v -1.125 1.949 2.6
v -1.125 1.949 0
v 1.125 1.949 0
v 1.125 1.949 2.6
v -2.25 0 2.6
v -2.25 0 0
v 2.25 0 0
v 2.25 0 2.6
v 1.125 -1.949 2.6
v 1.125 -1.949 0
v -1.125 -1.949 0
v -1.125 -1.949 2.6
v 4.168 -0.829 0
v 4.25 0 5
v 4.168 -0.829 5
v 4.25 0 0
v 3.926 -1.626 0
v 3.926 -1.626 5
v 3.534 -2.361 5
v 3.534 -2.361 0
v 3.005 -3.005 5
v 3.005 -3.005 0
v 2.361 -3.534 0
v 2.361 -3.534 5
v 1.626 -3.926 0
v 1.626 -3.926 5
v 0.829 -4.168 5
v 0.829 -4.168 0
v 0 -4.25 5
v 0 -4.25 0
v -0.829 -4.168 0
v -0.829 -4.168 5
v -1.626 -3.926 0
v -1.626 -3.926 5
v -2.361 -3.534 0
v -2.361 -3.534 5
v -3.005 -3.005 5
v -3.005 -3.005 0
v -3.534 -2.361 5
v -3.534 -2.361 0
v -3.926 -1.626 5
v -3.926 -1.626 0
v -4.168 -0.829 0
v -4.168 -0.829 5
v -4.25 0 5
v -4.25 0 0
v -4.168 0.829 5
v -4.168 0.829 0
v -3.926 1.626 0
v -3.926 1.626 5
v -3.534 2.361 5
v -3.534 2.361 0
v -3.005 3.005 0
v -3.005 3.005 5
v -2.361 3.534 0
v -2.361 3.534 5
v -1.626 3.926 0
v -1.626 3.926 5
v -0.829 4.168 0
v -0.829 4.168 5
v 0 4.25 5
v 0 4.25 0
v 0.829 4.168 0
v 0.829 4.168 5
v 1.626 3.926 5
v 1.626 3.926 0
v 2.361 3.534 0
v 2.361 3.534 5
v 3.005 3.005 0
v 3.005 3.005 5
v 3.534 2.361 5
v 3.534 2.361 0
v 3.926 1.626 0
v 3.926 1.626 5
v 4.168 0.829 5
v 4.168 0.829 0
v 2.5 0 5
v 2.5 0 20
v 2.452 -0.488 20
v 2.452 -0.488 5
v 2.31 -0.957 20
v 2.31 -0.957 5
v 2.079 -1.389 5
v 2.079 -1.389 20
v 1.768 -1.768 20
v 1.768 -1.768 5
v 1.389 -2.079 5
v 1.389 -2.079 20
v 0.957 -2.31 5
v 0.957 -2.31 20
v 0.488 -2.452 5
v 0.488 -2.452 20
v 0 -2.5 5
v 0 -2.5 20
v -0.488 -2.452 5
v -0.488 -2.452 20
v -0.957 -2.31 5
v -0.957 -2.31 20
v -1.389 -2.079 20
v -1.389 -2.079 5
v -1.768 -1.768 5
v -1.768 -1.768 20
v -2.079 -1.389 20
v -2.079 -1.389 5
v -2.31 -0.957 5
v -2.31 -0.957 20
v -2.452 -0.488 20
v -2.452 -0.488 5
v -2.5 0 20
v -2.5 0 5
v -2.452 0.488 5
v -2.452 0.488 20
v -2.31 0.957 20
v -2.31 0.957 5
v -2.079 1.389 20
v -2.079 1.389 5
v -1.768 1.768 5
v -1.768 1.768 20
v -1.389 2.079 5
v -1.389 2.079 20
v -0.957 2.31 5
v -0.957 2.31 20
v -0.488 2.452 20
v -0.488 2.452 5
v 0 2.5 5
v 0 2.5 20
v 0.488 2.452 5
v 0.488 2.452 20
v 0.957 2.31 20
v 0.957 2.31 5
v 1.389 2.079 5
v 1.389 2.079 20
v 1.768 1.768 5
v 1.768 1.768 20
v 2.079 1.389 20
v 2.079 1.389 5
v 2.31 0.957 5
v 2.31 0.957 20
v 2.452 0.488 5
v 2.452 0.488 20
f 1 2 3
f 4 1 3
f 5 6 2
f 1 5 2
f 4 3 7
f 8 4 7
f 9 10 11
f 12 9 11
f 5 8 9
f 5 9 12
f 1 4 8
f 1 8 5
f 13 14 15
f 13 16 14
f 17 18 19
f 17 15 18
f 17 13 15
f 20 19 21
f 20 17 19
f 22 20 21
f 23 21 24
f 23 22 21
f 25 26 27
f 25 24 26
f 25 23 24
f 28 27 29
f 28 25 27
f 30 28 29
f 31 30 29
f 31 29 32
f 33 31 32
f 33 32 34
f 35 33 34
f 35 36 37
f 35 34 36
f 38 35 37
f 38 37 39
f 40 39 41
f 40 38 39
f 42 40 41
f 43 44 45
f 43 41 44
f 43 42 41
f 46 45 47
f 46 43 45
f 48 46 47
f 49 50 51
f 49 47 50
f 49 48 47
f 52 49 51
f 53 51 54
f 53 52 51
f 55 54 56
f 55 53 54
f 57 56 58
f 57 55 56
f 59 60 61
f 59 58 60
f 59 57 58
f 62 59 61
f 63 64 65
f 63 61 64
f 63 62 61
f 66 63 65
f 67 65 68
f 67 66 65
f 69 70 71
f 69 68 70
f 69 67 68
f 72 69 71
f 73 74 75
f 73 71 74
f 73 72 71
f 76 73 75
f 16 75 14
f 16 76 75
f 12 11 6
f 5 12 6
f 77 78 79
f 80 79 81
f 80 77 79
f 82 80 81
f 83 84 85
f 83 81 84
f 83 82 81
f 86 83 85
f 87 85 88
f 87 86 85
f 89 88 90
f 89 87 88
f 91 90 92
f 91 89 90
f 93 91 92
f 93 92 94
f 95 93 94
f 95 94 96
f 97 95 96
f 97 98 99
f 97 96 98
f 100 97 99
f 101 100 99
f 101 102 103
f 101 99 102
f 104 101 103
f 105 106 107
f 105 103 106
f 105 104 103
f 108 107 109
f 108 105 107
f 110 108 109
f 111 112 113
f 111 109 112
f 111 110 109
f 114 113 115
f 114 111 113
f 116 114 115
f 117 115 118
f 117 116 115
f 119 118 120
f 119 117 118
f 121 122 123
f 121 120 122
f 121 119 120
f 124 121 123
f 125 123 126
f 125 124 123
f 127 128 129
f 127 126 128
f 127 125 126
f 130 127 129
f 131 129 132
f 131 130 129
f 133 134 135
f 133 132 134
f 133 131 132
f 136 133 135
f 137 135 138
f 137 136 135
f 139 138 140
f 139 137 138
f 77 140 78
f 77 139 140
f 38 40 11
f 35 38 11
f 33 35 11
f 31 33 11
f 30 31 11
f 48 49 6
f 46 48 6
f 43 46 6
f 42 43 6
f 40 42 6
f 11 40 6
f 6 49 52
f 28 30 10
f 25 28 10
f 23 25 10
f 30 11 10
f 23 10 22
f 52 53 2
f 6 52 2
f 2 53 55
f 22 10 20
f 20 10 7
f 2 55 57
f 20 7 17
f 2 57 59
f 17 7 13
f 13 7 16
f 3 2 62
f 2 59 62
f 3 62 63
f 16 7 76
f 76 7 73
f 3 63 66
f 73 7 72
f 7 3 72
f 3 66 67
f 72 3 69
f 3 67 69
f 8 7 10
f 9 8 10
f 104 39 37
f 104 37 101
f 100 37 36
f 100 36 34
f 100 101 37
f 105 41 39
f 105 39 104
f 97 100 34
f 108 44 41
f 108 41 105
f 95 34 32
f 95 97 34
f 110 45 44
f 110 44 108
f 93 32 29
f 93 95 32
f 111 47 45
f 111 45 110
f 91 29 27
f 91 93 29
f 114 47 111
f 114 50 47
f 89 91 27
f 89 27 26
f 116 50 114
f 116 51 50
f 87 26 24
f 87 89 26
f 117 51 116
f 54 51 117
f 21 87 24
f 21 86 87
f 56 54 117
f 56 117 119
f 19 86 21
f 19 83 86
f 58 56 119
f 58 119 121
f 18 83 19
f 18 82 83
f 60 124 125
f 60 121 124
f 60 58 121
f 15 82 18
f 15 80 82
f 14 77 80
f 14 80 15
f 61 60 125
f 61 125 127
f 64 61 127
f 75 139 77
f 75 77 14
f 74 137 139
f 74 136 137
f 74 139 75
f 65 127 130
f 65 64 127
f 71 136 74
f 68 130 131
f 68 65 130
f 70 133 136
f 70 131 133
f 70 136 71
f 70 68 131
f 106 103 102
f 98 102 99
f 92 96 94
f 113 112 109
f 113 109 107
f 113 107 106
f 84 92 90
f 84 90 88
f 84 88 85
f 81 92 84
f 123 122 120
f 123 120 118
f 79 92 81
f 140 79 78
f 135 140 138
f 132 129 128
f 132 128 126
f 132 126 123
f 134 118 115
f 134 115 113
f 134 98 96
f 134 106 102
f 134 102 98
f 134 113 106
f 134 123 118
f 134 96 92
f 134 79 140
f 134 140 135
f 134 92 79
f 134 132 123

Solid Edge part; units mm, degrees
sketch "Sketch1" plane through (0, 0, 0) normal (0, 0, 1) x (1, 0, 0)
  circle A0 centre (0, 0) radius 4.25
  dimension "D1" = 8.5
extrude "Protrusion1" add sketch "Sketch1" along normal blind 5
sketch "Sketch2" plane through (0, 0, 5) normal (0, 0, 1) x (1, 0, 0)
  circle A0 centre (0, 0) radius 2.5
extrude "ExtrudedProtrusion_2" add sketch "Sketch2" along normal blind 15
sketch "Sketch3" plane through (0, 0, 0) normal (0, 0, -1) x (-1, 0, 0)
  line L0 (2.25, 0) -> (1.125, 1.9486)
  line L1 (1.125, 1.9486) -> (-1.125, 1.9486)
  line L2 (-1.125, 1.9486) -> (-2.25, 0)
  line L3 (-2.25, 0) -> (-1.125, -1.9486)
  line L4 (-1.125, -1.9486) -> (1.125, -1.9486)
  line L5 (1.125, -1.9486) -> (2.25, 0)
extrude "ExtrudedCutout_1" cut sketch "Sketch3" against normal blind 2.6
properties material "Stainless steel"
